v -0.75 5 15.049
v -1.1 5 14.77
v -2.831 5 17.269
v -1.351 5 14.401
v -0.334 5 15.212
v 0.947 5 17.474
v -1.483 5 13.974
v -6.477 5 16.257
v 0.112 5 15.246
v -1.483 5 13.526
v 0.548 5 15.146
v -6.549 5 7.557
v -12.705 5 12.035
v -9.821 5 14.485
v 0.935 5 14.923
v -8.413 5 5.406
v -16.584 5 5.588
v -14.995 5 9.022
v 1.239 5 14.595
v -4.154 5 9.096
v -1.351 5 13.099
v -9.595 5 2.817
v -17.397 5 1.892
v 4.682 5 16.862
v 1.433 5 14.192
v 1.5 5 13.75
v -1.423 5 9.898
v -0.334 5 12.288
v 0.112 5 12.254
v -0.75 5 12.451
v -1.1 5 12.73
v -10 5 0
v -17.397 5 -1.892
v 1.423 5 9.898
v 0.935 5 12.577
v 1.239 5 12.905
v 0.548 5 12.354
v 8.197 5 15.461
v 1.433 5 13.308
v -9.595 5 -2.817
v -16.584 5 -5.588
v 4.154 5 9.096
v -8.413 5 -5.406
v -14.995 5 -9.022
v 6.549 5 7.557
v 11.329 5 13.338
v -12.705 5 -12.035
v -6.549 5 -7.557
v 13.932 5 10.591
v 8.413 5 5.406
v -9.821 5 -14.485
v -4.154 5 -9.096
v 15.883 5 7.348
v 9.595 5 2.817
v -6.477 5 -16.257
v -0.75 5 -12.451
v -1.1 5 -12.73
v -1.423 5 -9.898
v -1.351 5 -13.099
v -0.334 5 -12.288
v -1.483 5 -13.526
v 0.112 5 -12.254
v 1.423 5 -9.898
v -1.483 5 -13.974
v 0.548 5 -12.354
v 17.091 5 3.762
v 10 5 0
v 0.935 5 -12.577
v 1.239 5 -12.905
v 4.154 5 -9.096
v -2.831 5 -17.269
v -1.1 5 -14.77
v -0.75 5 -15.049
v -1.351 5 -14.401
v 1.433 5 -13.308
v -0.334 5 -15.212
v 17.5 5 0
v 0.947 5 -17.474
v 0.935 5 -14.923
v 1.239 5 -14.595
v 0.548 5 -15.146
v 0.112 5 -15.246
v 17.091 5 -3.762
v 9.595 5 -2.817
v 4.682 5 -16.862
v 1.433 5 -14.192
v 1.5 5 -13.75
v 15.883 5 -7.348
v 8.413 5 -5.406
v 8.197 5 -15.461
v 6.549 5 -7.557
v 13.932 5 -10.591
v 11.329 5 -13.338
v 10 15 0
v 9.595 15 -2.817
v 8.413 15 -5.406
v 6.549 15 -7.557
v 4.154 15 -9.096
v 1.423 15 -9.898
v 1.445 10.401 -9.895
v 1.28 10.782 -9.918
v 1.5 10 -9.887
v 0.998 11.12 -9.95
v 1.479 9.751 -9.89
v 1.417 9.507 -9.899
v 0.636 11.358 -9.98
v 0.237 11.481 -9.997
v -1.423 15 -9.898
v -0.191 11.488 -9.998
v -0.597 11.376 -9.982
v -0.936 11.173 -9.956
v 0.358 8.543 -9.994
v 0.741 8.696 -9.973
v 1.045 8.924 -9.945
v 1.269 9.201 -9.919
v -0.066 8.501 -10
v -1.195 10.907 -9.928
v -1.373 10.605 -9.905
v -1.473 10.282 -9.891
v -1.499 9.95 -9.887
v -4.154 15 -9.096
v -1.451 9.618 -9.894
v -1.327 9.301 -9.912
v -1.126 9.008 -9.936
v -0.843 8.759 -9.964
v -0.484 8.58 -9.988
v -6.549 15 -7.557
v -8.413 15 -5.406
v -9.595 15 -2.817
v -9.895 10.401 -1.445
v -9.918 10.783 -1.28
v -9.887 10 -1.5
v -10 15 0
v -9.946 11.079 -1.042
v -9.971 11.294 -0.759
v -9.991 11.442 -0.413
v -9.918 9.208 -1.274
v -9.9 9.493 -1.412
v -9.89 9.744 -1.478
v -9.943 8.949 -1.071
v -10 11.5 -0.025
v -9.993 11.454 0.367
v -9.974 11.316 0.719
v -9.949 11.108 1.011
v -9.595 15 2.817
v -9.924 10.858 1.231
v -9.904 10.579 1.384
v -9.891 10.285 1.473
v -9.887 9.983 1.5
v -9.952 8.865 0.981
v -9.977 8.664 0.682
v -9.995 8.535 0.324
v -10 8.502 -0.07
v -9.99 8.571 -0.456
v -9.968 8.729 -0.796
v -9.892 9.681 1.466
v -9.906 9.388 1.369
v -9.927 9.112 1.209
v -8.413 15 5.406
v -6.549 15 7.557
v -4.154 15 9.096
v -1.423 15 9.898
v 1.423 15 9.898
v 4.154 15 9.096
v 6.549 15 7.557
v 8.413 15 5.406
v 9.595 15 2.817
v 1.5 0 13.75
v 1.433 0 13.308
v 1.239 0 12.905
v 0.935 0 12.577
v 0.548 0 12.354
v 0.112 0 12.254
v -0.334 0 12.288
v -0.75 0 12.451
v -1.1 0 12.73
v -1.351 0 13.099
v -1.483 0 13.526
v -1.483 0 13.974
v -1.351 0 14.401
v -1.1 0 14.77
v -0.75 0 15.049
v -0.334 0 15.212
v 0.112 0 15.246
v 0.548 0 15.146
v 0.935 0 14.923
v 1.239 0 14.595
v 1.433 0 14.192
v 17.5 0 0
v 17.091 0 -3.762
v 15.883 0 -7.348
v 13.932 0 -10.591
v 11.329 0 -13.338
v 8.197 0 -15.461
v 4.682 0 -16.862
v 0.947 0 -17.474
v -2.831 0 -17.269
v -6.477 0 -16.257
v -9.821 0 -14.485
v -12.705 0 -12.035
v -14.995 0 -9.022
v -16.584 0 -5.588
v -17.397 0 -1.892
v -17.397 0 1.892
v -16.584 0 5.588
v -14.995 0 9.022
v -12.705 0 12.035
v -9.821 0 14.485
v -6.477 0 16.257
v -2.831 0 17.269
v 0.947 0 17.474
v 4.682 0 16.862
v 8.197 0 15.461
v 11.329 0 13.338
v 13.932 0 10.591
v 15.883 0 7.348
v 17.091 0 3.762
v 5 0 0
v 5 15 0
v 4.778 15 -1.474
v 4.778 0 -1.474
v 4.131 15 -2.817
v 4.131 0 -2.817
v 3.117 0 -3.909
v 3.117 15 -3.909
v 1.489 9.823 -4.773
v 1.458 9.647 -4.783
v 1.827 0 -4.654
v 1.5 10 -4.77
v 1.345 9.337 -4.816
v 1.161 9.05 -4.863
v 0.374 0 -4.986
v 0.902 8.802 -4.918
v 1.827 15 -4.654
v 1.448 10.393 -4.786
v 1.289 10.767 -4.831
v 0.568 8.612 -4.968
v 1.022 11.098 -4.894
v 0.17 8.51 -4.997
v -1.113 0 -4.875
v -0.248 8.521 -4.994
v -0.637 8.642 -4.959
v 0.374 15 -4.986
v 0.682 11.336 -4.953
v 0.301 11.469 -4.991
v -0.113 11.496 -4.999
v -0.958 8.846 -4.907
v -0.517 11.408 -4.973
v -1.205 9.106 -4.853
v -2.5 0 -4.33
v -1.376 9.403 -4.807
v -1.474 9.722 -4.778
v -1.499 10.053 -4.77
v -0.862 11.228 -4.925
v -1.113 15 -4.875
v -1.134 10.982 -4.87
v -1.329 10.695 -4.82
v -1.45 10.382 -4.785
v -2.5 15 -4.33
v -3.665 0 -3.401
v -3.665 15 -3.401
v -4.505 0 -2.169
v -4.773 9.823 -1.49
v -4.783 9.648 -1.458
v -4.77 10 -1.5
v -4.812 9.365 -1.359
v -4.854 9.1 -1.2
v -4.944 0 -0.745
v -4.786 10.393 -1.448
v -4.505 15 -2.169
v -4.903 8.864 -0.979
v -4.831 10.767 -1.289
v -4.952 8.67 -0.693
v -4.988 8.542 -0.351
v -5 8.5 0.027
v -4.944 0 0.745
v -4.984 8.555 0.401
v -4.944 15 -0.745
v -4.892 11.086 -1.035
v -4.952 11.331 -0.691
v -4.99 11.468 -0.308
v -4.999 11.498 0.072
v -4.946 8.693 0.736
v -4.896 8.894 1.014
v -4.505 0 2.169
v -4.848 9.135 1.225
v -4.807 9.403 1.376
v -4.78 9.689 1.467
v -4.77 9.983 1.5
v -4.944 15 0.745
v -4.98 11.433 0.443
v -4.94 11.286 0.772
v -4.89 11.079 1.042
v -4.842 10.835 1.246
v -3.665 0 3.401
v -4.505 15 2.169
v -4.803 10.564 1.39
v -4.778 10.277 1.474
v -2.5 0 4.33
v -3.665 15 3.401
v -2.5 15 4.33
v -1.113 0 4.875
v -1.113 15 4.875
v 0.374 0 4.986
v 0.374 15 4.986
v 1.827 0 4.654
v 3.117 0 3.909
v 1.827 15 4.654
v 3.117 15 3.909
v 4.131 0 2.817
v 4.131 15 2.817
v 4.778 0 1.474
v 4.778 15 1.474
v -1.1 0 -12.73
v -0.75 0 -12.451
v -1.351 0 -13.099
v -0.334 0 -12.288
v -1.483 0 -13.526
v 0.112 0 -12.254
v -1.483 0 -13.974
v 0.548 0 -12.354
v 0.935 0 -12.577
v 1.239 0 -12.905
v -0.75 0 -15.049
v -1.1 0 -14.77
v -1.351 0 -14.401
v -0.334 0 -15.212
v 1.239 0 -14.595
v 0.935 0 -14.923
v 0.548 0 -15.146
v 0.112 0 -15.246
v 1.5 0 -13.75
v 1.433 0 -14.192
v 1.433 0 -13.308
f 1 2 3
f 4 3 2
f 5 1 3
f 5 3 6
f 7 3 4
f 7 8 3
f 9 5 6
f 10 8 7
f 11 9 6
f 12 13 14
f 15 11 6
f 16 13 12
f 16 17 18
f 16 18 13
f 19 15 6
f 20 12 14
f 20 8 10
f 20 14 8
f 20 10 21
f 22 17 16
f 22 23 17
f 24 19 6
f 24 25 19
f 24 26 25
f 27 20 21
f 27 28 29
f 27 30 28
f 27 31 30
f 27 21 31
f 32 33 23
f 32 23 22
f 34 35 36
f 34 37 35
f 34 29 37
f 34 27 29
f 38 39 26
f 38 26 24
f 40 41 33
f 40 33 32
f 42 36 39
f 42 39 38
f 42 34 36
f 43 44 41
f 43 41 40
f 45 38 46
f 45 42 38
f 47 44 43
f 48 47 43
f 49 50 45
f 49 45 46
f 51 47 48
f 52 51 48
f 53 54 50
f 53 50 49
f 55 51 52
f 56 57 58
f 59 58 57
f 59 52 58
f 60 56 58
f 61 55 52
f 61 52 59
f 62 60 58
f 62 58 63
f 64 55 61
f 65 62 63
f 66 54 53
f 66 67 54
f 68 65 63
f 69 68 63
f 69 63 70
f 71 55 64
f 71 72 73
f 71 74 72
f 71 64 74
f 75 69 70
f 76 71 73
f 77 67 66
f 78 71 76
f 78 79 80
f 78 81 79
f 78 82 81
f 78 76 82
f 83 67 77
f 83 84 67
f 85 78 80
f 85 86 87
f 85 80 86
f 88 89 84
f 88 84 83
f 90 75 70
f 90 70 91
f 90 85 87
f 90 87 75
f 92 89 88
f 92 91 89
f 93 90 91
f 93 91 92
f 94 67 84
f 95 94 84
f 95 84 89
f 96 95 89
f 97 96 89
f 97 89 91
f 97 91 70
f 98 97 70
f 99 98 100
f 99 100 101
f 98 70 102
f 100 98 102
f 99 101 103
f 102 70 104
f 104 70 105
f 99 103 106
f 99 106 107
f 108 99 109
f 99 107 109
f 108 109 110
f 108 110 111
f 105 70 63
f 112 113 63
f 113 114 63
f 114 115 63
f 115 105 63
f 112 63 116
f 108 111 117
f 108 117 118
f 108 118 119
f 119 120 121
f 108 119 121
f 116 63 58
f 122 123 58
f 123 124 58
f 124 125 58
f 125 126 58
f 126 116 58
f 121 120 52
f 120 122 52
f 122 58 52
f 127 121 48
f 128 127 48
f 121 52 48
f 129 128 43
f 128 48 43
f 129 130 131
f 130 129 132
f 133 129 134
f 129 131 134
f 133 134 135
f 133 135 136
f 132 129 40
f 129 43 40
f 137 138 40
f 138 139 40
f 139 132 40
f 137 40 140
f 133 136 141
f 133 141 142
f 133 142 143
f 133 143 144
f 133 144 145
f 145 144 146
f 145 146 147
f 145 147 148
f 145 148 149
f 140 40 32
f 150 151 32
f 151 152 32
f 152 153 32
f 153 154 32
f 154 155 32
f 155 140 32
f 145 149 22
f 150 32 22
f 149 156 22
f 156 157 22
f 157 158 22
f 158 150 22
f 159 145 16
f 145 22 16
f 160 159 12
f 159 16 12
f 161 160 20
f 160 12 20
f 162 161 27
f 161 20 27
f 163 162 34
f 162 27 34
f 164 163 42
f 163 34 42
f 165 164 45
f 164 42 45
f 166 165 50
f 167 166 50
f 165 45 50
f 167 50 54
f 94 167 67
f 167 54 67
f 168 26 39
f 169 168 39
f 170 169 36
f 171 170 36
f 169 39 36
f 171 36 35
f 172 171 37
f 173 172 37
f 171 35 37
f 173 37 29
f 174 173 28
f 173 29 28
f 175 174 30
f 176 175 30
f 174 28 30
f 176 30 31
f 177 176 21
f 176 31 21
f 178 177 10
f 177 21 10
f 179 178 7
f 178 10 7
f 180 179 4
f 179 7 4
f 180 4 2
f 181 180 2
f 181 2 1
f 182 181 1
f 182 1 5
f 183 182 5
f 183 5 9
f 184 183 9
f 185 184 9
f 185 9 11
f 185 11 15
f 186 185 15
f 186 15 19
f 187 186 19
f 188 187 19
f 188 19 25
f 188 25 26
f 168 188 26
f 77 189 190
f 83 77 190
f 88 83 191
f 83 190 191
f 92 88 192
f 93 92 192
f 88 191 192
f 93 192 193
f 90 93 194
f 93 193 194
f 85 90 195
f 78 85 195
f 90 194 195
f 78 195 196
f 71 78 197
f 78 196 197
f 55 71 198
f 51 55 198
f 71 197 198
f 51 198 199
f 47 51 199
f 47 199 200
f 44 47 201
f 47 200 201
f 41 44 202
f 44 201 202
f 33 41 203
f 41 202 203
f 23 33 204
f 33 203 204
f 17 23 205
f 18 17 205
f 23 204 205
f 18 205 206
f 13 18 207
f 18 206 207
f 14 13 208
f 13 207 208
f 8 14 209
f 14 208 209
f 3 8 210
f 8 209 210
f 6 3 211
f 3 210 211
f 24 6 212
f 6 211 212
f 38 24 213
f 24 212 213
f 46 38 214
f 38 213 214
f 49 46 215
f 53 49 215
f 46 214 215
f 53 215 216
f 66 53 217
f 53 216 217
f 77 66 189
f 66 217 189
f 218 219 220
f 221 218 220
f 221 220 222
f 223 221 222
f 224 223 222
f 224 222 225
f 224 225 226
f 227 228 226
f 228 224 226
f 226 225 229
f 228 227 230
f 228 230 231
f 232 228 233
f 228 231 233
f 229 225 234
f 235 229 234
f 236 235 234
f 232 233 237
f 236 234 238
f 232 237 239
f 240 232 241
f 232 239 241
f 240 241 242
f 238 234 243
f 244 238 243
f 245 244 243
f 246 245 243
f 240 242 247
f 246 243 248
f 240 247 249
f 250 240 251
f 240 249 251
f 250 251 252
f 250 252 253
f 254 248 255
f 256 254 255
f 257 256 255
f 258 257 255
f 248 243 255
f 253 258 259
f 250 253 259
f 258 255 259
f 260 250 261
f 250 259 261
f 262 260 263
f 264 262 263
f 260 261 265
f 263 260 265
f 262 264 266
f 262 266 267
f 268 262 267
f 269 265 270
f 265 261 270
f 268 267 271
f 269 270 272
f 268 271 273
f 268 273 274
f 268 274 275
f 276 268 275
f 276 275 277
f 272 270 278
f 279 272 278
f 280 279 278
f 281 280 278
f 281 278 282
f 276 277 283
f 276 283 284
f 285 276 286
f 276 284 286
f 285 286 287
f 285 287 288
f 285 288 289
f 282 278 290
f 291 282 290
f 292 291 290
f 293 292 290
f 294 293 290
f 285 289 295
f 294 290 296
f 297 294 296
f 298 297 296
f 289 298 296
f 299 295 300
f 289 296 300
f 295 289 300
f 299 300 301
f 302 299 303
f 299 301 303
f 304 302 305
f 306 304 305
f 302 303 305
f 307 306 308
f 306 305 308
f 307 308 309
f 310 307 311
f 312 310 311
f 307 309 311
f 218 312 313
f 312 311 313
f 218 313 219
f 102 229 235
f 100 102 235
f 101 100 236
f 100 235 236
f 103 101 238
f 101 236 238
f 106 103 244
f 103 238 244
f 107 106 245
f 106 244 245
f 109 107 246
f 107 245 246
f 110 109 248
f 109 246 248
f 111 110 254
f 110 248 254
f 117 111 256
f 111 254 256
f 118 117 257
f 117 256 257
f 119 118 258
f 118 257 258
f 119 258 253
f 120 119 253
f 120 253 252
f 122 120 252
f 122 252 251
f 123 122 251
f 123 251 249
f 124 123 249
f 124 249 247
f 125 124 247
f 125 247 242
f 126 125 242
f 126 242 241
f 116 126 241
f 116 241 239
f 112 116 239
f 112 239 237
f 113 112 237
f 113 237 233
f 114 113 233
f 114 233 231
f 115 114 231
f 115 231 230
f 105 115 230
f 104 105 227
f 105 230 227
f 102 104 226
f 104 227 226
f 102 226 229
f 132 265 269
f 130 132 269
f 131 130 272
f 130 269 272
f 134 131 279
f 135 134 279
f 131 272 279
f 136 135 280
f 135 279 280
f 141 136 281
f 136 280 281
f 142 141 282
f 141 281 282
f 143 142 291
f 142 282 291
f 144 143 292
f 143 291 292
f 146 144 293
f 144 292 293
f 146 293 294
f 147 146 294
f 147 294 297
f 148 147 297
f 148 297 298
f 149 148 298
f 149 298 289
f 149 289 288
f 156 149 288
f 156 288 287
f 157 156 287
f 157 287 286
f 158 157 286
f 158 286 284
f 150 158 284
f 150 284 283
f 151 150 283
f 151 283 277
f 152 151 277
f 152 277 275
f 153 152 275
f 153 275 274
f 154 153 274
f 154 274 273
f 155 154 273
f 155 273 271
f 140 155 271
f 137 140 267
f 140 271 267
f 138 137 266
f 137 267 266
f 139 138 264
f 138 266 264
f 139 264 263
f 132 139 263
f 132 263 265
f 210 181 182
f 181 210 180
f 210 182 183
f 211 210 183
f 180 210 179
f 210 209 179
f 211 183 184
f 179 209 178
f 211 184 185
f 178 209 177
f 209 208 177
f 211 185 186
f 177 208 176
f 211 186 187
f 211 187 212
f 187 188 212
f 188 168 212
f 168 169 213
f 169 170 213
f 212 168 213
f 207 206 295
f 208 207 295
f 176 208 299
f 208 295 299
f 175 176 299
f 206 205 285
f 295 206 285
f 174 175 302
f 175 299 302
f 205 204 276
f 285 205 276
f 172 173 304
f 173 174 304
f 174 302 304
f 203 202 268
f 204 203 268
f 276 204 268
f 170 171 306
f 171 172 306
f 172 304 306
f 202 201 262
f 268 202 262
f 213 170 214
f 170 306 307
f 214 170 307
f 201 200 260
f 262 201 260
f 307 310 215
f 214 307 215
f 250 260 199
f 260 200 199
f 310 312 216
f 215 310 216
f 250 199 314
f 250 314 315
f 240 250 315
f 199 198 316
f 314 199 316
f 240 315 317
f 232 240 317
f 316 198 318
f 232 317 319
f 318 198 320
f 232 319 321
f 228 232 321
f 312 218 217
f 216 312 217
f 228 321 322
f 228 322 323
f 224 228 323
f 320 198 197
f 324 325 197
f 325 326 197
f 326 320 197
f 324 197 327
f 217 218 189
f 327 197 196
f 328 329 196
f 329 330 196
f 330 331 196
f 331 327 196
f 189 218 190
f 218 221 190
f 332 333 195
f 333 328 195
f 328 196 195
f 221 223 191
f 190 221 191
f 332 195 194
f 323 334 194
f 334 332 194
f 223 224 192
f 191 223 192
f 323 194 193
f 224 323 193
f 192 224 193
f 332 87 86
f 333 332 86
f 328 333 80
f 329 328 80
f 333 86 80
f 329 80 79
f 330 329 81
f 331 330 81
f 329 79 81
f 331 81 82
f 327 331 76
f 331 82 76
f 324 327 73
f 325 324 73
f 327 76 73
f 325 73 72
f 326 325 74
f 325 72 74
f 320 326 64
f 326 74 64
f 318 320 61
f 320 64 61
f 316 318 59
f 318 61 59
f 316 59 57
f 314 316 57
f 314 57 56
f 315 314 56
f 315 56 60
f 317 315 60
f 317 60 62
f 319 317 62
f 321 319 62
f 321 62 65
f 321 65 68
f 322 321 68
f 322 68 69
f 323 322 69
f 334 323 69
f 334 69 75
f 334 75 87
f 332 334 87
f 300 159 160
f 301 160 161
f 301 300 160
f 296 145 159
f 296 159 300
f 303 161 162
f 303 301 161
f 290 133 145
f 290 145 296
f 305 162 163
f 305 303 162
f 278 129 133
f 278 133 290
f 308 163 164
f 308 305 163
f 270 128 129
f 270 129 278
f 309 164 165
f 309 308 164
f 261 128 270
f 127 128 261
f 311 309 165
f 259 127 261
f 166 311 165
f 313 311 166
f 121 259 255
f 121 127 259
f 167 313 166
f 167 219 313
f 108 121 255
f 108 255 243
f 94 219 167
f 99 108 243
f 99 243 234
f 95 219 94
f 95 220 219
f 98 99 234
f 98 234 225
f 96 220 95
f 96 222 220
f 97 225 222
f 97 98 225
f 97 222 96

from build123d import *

# Parameters (mm, degrees)
ESBO_O1_R                = 17.5
RESSALTO_EXTRUS_O1_DEPTH = 5
ESBO_O2_R                = 10
RESSALTO_EXTRUS_O2_DEPTH = 10
ESBO_O3_R                = 5
CORTE_EXTRUS_O1_DEPTH    = 16
ESBO_O4_R                = 1.5
CORTE_EXTRUS_O2_DEPTH    = 10
ESBO_O5_R                = 1.5
CORTE_EXTRUS_O3_DEPTH    = 18.5
ESBO_O6_R                = 1.5
CORTE_EXTRUS_O4_DEPTH    = 10


with BuildPart() as part:
    # Esboço1 → Ressalto-extrusão1 (new body)
    with BuildSketch(Plane(origin=(0, 0, 0), x_dir=(1, 0, 0), z_dir=(0, 1, 0))):
        Circle(ESBO_O1_R)
    extrude(amount=RESSALTO_EXTRUS_O1_DEPTH)

    # Esboço2 → Ressalto-extrusão2 (add)
    with BuildSketch(Plane(origin=(0, 5, 0), x_dir=(1, 0, 0), z_dir=(0, 1, 0))):
        Circle(ESBO_O2_R)
    extrude(amount=RESSALTO_EXTRUS_O2_DEPTH)

    # Esboço3 → Corte-extrusão1 (cut, through all)
    with BuildSketch(Plane(origin=(0, 15, 0), x_dir=(1, 0, 0), z_dir=(0, 1, 0))):
        Circle(ESBO_O3_R)
    extrude(amount=-CORTE_EXTRUS_O1_DEPTH, mode=Mode.SUBTRACT)

    # Esboço4 → Corte-extrusão2 (cut)
    with BuildSketch(Plane(origin=(0, 5, 0), x_dir=(1, 0, 0), z_dir=(0, 1, 0))):
        with Locations((0, 13.75)):
            Circle(ESBO_O4_R)
        with Locations((0, -13.75)):
            Circle(ESBO_O4_R)
    extrude(amount=-CORTE_EXTRUS_O2_DEPTH, mode=Mode.SUBTRACT)

    # Esboço5 → Corte-extrusão3 (cut, through all)
    with BuildSketch(Plane.XY):
        with Locations((0, 10)):
            Circle(ESBO_O5_R)
    extrude(amount=-CORTE_EXTRUS_O3_DEPTH, mode=Mode.SUBTRACT)

    # Esboço6 → Corte-extrusão4 (cut)
    with BuildSketch(Plane(origin=(0, 0, 0), x_dir=(0, 0, -1), z_dir=(1, 0, 0))):
        with Locations((0, 10)):
            Circle(ESBO_O6_R)
    extrude(amount=-CORTE_EXTRUS_O4_DEPTH, mode=Mode.SUBTRACT)


solid = part.part
